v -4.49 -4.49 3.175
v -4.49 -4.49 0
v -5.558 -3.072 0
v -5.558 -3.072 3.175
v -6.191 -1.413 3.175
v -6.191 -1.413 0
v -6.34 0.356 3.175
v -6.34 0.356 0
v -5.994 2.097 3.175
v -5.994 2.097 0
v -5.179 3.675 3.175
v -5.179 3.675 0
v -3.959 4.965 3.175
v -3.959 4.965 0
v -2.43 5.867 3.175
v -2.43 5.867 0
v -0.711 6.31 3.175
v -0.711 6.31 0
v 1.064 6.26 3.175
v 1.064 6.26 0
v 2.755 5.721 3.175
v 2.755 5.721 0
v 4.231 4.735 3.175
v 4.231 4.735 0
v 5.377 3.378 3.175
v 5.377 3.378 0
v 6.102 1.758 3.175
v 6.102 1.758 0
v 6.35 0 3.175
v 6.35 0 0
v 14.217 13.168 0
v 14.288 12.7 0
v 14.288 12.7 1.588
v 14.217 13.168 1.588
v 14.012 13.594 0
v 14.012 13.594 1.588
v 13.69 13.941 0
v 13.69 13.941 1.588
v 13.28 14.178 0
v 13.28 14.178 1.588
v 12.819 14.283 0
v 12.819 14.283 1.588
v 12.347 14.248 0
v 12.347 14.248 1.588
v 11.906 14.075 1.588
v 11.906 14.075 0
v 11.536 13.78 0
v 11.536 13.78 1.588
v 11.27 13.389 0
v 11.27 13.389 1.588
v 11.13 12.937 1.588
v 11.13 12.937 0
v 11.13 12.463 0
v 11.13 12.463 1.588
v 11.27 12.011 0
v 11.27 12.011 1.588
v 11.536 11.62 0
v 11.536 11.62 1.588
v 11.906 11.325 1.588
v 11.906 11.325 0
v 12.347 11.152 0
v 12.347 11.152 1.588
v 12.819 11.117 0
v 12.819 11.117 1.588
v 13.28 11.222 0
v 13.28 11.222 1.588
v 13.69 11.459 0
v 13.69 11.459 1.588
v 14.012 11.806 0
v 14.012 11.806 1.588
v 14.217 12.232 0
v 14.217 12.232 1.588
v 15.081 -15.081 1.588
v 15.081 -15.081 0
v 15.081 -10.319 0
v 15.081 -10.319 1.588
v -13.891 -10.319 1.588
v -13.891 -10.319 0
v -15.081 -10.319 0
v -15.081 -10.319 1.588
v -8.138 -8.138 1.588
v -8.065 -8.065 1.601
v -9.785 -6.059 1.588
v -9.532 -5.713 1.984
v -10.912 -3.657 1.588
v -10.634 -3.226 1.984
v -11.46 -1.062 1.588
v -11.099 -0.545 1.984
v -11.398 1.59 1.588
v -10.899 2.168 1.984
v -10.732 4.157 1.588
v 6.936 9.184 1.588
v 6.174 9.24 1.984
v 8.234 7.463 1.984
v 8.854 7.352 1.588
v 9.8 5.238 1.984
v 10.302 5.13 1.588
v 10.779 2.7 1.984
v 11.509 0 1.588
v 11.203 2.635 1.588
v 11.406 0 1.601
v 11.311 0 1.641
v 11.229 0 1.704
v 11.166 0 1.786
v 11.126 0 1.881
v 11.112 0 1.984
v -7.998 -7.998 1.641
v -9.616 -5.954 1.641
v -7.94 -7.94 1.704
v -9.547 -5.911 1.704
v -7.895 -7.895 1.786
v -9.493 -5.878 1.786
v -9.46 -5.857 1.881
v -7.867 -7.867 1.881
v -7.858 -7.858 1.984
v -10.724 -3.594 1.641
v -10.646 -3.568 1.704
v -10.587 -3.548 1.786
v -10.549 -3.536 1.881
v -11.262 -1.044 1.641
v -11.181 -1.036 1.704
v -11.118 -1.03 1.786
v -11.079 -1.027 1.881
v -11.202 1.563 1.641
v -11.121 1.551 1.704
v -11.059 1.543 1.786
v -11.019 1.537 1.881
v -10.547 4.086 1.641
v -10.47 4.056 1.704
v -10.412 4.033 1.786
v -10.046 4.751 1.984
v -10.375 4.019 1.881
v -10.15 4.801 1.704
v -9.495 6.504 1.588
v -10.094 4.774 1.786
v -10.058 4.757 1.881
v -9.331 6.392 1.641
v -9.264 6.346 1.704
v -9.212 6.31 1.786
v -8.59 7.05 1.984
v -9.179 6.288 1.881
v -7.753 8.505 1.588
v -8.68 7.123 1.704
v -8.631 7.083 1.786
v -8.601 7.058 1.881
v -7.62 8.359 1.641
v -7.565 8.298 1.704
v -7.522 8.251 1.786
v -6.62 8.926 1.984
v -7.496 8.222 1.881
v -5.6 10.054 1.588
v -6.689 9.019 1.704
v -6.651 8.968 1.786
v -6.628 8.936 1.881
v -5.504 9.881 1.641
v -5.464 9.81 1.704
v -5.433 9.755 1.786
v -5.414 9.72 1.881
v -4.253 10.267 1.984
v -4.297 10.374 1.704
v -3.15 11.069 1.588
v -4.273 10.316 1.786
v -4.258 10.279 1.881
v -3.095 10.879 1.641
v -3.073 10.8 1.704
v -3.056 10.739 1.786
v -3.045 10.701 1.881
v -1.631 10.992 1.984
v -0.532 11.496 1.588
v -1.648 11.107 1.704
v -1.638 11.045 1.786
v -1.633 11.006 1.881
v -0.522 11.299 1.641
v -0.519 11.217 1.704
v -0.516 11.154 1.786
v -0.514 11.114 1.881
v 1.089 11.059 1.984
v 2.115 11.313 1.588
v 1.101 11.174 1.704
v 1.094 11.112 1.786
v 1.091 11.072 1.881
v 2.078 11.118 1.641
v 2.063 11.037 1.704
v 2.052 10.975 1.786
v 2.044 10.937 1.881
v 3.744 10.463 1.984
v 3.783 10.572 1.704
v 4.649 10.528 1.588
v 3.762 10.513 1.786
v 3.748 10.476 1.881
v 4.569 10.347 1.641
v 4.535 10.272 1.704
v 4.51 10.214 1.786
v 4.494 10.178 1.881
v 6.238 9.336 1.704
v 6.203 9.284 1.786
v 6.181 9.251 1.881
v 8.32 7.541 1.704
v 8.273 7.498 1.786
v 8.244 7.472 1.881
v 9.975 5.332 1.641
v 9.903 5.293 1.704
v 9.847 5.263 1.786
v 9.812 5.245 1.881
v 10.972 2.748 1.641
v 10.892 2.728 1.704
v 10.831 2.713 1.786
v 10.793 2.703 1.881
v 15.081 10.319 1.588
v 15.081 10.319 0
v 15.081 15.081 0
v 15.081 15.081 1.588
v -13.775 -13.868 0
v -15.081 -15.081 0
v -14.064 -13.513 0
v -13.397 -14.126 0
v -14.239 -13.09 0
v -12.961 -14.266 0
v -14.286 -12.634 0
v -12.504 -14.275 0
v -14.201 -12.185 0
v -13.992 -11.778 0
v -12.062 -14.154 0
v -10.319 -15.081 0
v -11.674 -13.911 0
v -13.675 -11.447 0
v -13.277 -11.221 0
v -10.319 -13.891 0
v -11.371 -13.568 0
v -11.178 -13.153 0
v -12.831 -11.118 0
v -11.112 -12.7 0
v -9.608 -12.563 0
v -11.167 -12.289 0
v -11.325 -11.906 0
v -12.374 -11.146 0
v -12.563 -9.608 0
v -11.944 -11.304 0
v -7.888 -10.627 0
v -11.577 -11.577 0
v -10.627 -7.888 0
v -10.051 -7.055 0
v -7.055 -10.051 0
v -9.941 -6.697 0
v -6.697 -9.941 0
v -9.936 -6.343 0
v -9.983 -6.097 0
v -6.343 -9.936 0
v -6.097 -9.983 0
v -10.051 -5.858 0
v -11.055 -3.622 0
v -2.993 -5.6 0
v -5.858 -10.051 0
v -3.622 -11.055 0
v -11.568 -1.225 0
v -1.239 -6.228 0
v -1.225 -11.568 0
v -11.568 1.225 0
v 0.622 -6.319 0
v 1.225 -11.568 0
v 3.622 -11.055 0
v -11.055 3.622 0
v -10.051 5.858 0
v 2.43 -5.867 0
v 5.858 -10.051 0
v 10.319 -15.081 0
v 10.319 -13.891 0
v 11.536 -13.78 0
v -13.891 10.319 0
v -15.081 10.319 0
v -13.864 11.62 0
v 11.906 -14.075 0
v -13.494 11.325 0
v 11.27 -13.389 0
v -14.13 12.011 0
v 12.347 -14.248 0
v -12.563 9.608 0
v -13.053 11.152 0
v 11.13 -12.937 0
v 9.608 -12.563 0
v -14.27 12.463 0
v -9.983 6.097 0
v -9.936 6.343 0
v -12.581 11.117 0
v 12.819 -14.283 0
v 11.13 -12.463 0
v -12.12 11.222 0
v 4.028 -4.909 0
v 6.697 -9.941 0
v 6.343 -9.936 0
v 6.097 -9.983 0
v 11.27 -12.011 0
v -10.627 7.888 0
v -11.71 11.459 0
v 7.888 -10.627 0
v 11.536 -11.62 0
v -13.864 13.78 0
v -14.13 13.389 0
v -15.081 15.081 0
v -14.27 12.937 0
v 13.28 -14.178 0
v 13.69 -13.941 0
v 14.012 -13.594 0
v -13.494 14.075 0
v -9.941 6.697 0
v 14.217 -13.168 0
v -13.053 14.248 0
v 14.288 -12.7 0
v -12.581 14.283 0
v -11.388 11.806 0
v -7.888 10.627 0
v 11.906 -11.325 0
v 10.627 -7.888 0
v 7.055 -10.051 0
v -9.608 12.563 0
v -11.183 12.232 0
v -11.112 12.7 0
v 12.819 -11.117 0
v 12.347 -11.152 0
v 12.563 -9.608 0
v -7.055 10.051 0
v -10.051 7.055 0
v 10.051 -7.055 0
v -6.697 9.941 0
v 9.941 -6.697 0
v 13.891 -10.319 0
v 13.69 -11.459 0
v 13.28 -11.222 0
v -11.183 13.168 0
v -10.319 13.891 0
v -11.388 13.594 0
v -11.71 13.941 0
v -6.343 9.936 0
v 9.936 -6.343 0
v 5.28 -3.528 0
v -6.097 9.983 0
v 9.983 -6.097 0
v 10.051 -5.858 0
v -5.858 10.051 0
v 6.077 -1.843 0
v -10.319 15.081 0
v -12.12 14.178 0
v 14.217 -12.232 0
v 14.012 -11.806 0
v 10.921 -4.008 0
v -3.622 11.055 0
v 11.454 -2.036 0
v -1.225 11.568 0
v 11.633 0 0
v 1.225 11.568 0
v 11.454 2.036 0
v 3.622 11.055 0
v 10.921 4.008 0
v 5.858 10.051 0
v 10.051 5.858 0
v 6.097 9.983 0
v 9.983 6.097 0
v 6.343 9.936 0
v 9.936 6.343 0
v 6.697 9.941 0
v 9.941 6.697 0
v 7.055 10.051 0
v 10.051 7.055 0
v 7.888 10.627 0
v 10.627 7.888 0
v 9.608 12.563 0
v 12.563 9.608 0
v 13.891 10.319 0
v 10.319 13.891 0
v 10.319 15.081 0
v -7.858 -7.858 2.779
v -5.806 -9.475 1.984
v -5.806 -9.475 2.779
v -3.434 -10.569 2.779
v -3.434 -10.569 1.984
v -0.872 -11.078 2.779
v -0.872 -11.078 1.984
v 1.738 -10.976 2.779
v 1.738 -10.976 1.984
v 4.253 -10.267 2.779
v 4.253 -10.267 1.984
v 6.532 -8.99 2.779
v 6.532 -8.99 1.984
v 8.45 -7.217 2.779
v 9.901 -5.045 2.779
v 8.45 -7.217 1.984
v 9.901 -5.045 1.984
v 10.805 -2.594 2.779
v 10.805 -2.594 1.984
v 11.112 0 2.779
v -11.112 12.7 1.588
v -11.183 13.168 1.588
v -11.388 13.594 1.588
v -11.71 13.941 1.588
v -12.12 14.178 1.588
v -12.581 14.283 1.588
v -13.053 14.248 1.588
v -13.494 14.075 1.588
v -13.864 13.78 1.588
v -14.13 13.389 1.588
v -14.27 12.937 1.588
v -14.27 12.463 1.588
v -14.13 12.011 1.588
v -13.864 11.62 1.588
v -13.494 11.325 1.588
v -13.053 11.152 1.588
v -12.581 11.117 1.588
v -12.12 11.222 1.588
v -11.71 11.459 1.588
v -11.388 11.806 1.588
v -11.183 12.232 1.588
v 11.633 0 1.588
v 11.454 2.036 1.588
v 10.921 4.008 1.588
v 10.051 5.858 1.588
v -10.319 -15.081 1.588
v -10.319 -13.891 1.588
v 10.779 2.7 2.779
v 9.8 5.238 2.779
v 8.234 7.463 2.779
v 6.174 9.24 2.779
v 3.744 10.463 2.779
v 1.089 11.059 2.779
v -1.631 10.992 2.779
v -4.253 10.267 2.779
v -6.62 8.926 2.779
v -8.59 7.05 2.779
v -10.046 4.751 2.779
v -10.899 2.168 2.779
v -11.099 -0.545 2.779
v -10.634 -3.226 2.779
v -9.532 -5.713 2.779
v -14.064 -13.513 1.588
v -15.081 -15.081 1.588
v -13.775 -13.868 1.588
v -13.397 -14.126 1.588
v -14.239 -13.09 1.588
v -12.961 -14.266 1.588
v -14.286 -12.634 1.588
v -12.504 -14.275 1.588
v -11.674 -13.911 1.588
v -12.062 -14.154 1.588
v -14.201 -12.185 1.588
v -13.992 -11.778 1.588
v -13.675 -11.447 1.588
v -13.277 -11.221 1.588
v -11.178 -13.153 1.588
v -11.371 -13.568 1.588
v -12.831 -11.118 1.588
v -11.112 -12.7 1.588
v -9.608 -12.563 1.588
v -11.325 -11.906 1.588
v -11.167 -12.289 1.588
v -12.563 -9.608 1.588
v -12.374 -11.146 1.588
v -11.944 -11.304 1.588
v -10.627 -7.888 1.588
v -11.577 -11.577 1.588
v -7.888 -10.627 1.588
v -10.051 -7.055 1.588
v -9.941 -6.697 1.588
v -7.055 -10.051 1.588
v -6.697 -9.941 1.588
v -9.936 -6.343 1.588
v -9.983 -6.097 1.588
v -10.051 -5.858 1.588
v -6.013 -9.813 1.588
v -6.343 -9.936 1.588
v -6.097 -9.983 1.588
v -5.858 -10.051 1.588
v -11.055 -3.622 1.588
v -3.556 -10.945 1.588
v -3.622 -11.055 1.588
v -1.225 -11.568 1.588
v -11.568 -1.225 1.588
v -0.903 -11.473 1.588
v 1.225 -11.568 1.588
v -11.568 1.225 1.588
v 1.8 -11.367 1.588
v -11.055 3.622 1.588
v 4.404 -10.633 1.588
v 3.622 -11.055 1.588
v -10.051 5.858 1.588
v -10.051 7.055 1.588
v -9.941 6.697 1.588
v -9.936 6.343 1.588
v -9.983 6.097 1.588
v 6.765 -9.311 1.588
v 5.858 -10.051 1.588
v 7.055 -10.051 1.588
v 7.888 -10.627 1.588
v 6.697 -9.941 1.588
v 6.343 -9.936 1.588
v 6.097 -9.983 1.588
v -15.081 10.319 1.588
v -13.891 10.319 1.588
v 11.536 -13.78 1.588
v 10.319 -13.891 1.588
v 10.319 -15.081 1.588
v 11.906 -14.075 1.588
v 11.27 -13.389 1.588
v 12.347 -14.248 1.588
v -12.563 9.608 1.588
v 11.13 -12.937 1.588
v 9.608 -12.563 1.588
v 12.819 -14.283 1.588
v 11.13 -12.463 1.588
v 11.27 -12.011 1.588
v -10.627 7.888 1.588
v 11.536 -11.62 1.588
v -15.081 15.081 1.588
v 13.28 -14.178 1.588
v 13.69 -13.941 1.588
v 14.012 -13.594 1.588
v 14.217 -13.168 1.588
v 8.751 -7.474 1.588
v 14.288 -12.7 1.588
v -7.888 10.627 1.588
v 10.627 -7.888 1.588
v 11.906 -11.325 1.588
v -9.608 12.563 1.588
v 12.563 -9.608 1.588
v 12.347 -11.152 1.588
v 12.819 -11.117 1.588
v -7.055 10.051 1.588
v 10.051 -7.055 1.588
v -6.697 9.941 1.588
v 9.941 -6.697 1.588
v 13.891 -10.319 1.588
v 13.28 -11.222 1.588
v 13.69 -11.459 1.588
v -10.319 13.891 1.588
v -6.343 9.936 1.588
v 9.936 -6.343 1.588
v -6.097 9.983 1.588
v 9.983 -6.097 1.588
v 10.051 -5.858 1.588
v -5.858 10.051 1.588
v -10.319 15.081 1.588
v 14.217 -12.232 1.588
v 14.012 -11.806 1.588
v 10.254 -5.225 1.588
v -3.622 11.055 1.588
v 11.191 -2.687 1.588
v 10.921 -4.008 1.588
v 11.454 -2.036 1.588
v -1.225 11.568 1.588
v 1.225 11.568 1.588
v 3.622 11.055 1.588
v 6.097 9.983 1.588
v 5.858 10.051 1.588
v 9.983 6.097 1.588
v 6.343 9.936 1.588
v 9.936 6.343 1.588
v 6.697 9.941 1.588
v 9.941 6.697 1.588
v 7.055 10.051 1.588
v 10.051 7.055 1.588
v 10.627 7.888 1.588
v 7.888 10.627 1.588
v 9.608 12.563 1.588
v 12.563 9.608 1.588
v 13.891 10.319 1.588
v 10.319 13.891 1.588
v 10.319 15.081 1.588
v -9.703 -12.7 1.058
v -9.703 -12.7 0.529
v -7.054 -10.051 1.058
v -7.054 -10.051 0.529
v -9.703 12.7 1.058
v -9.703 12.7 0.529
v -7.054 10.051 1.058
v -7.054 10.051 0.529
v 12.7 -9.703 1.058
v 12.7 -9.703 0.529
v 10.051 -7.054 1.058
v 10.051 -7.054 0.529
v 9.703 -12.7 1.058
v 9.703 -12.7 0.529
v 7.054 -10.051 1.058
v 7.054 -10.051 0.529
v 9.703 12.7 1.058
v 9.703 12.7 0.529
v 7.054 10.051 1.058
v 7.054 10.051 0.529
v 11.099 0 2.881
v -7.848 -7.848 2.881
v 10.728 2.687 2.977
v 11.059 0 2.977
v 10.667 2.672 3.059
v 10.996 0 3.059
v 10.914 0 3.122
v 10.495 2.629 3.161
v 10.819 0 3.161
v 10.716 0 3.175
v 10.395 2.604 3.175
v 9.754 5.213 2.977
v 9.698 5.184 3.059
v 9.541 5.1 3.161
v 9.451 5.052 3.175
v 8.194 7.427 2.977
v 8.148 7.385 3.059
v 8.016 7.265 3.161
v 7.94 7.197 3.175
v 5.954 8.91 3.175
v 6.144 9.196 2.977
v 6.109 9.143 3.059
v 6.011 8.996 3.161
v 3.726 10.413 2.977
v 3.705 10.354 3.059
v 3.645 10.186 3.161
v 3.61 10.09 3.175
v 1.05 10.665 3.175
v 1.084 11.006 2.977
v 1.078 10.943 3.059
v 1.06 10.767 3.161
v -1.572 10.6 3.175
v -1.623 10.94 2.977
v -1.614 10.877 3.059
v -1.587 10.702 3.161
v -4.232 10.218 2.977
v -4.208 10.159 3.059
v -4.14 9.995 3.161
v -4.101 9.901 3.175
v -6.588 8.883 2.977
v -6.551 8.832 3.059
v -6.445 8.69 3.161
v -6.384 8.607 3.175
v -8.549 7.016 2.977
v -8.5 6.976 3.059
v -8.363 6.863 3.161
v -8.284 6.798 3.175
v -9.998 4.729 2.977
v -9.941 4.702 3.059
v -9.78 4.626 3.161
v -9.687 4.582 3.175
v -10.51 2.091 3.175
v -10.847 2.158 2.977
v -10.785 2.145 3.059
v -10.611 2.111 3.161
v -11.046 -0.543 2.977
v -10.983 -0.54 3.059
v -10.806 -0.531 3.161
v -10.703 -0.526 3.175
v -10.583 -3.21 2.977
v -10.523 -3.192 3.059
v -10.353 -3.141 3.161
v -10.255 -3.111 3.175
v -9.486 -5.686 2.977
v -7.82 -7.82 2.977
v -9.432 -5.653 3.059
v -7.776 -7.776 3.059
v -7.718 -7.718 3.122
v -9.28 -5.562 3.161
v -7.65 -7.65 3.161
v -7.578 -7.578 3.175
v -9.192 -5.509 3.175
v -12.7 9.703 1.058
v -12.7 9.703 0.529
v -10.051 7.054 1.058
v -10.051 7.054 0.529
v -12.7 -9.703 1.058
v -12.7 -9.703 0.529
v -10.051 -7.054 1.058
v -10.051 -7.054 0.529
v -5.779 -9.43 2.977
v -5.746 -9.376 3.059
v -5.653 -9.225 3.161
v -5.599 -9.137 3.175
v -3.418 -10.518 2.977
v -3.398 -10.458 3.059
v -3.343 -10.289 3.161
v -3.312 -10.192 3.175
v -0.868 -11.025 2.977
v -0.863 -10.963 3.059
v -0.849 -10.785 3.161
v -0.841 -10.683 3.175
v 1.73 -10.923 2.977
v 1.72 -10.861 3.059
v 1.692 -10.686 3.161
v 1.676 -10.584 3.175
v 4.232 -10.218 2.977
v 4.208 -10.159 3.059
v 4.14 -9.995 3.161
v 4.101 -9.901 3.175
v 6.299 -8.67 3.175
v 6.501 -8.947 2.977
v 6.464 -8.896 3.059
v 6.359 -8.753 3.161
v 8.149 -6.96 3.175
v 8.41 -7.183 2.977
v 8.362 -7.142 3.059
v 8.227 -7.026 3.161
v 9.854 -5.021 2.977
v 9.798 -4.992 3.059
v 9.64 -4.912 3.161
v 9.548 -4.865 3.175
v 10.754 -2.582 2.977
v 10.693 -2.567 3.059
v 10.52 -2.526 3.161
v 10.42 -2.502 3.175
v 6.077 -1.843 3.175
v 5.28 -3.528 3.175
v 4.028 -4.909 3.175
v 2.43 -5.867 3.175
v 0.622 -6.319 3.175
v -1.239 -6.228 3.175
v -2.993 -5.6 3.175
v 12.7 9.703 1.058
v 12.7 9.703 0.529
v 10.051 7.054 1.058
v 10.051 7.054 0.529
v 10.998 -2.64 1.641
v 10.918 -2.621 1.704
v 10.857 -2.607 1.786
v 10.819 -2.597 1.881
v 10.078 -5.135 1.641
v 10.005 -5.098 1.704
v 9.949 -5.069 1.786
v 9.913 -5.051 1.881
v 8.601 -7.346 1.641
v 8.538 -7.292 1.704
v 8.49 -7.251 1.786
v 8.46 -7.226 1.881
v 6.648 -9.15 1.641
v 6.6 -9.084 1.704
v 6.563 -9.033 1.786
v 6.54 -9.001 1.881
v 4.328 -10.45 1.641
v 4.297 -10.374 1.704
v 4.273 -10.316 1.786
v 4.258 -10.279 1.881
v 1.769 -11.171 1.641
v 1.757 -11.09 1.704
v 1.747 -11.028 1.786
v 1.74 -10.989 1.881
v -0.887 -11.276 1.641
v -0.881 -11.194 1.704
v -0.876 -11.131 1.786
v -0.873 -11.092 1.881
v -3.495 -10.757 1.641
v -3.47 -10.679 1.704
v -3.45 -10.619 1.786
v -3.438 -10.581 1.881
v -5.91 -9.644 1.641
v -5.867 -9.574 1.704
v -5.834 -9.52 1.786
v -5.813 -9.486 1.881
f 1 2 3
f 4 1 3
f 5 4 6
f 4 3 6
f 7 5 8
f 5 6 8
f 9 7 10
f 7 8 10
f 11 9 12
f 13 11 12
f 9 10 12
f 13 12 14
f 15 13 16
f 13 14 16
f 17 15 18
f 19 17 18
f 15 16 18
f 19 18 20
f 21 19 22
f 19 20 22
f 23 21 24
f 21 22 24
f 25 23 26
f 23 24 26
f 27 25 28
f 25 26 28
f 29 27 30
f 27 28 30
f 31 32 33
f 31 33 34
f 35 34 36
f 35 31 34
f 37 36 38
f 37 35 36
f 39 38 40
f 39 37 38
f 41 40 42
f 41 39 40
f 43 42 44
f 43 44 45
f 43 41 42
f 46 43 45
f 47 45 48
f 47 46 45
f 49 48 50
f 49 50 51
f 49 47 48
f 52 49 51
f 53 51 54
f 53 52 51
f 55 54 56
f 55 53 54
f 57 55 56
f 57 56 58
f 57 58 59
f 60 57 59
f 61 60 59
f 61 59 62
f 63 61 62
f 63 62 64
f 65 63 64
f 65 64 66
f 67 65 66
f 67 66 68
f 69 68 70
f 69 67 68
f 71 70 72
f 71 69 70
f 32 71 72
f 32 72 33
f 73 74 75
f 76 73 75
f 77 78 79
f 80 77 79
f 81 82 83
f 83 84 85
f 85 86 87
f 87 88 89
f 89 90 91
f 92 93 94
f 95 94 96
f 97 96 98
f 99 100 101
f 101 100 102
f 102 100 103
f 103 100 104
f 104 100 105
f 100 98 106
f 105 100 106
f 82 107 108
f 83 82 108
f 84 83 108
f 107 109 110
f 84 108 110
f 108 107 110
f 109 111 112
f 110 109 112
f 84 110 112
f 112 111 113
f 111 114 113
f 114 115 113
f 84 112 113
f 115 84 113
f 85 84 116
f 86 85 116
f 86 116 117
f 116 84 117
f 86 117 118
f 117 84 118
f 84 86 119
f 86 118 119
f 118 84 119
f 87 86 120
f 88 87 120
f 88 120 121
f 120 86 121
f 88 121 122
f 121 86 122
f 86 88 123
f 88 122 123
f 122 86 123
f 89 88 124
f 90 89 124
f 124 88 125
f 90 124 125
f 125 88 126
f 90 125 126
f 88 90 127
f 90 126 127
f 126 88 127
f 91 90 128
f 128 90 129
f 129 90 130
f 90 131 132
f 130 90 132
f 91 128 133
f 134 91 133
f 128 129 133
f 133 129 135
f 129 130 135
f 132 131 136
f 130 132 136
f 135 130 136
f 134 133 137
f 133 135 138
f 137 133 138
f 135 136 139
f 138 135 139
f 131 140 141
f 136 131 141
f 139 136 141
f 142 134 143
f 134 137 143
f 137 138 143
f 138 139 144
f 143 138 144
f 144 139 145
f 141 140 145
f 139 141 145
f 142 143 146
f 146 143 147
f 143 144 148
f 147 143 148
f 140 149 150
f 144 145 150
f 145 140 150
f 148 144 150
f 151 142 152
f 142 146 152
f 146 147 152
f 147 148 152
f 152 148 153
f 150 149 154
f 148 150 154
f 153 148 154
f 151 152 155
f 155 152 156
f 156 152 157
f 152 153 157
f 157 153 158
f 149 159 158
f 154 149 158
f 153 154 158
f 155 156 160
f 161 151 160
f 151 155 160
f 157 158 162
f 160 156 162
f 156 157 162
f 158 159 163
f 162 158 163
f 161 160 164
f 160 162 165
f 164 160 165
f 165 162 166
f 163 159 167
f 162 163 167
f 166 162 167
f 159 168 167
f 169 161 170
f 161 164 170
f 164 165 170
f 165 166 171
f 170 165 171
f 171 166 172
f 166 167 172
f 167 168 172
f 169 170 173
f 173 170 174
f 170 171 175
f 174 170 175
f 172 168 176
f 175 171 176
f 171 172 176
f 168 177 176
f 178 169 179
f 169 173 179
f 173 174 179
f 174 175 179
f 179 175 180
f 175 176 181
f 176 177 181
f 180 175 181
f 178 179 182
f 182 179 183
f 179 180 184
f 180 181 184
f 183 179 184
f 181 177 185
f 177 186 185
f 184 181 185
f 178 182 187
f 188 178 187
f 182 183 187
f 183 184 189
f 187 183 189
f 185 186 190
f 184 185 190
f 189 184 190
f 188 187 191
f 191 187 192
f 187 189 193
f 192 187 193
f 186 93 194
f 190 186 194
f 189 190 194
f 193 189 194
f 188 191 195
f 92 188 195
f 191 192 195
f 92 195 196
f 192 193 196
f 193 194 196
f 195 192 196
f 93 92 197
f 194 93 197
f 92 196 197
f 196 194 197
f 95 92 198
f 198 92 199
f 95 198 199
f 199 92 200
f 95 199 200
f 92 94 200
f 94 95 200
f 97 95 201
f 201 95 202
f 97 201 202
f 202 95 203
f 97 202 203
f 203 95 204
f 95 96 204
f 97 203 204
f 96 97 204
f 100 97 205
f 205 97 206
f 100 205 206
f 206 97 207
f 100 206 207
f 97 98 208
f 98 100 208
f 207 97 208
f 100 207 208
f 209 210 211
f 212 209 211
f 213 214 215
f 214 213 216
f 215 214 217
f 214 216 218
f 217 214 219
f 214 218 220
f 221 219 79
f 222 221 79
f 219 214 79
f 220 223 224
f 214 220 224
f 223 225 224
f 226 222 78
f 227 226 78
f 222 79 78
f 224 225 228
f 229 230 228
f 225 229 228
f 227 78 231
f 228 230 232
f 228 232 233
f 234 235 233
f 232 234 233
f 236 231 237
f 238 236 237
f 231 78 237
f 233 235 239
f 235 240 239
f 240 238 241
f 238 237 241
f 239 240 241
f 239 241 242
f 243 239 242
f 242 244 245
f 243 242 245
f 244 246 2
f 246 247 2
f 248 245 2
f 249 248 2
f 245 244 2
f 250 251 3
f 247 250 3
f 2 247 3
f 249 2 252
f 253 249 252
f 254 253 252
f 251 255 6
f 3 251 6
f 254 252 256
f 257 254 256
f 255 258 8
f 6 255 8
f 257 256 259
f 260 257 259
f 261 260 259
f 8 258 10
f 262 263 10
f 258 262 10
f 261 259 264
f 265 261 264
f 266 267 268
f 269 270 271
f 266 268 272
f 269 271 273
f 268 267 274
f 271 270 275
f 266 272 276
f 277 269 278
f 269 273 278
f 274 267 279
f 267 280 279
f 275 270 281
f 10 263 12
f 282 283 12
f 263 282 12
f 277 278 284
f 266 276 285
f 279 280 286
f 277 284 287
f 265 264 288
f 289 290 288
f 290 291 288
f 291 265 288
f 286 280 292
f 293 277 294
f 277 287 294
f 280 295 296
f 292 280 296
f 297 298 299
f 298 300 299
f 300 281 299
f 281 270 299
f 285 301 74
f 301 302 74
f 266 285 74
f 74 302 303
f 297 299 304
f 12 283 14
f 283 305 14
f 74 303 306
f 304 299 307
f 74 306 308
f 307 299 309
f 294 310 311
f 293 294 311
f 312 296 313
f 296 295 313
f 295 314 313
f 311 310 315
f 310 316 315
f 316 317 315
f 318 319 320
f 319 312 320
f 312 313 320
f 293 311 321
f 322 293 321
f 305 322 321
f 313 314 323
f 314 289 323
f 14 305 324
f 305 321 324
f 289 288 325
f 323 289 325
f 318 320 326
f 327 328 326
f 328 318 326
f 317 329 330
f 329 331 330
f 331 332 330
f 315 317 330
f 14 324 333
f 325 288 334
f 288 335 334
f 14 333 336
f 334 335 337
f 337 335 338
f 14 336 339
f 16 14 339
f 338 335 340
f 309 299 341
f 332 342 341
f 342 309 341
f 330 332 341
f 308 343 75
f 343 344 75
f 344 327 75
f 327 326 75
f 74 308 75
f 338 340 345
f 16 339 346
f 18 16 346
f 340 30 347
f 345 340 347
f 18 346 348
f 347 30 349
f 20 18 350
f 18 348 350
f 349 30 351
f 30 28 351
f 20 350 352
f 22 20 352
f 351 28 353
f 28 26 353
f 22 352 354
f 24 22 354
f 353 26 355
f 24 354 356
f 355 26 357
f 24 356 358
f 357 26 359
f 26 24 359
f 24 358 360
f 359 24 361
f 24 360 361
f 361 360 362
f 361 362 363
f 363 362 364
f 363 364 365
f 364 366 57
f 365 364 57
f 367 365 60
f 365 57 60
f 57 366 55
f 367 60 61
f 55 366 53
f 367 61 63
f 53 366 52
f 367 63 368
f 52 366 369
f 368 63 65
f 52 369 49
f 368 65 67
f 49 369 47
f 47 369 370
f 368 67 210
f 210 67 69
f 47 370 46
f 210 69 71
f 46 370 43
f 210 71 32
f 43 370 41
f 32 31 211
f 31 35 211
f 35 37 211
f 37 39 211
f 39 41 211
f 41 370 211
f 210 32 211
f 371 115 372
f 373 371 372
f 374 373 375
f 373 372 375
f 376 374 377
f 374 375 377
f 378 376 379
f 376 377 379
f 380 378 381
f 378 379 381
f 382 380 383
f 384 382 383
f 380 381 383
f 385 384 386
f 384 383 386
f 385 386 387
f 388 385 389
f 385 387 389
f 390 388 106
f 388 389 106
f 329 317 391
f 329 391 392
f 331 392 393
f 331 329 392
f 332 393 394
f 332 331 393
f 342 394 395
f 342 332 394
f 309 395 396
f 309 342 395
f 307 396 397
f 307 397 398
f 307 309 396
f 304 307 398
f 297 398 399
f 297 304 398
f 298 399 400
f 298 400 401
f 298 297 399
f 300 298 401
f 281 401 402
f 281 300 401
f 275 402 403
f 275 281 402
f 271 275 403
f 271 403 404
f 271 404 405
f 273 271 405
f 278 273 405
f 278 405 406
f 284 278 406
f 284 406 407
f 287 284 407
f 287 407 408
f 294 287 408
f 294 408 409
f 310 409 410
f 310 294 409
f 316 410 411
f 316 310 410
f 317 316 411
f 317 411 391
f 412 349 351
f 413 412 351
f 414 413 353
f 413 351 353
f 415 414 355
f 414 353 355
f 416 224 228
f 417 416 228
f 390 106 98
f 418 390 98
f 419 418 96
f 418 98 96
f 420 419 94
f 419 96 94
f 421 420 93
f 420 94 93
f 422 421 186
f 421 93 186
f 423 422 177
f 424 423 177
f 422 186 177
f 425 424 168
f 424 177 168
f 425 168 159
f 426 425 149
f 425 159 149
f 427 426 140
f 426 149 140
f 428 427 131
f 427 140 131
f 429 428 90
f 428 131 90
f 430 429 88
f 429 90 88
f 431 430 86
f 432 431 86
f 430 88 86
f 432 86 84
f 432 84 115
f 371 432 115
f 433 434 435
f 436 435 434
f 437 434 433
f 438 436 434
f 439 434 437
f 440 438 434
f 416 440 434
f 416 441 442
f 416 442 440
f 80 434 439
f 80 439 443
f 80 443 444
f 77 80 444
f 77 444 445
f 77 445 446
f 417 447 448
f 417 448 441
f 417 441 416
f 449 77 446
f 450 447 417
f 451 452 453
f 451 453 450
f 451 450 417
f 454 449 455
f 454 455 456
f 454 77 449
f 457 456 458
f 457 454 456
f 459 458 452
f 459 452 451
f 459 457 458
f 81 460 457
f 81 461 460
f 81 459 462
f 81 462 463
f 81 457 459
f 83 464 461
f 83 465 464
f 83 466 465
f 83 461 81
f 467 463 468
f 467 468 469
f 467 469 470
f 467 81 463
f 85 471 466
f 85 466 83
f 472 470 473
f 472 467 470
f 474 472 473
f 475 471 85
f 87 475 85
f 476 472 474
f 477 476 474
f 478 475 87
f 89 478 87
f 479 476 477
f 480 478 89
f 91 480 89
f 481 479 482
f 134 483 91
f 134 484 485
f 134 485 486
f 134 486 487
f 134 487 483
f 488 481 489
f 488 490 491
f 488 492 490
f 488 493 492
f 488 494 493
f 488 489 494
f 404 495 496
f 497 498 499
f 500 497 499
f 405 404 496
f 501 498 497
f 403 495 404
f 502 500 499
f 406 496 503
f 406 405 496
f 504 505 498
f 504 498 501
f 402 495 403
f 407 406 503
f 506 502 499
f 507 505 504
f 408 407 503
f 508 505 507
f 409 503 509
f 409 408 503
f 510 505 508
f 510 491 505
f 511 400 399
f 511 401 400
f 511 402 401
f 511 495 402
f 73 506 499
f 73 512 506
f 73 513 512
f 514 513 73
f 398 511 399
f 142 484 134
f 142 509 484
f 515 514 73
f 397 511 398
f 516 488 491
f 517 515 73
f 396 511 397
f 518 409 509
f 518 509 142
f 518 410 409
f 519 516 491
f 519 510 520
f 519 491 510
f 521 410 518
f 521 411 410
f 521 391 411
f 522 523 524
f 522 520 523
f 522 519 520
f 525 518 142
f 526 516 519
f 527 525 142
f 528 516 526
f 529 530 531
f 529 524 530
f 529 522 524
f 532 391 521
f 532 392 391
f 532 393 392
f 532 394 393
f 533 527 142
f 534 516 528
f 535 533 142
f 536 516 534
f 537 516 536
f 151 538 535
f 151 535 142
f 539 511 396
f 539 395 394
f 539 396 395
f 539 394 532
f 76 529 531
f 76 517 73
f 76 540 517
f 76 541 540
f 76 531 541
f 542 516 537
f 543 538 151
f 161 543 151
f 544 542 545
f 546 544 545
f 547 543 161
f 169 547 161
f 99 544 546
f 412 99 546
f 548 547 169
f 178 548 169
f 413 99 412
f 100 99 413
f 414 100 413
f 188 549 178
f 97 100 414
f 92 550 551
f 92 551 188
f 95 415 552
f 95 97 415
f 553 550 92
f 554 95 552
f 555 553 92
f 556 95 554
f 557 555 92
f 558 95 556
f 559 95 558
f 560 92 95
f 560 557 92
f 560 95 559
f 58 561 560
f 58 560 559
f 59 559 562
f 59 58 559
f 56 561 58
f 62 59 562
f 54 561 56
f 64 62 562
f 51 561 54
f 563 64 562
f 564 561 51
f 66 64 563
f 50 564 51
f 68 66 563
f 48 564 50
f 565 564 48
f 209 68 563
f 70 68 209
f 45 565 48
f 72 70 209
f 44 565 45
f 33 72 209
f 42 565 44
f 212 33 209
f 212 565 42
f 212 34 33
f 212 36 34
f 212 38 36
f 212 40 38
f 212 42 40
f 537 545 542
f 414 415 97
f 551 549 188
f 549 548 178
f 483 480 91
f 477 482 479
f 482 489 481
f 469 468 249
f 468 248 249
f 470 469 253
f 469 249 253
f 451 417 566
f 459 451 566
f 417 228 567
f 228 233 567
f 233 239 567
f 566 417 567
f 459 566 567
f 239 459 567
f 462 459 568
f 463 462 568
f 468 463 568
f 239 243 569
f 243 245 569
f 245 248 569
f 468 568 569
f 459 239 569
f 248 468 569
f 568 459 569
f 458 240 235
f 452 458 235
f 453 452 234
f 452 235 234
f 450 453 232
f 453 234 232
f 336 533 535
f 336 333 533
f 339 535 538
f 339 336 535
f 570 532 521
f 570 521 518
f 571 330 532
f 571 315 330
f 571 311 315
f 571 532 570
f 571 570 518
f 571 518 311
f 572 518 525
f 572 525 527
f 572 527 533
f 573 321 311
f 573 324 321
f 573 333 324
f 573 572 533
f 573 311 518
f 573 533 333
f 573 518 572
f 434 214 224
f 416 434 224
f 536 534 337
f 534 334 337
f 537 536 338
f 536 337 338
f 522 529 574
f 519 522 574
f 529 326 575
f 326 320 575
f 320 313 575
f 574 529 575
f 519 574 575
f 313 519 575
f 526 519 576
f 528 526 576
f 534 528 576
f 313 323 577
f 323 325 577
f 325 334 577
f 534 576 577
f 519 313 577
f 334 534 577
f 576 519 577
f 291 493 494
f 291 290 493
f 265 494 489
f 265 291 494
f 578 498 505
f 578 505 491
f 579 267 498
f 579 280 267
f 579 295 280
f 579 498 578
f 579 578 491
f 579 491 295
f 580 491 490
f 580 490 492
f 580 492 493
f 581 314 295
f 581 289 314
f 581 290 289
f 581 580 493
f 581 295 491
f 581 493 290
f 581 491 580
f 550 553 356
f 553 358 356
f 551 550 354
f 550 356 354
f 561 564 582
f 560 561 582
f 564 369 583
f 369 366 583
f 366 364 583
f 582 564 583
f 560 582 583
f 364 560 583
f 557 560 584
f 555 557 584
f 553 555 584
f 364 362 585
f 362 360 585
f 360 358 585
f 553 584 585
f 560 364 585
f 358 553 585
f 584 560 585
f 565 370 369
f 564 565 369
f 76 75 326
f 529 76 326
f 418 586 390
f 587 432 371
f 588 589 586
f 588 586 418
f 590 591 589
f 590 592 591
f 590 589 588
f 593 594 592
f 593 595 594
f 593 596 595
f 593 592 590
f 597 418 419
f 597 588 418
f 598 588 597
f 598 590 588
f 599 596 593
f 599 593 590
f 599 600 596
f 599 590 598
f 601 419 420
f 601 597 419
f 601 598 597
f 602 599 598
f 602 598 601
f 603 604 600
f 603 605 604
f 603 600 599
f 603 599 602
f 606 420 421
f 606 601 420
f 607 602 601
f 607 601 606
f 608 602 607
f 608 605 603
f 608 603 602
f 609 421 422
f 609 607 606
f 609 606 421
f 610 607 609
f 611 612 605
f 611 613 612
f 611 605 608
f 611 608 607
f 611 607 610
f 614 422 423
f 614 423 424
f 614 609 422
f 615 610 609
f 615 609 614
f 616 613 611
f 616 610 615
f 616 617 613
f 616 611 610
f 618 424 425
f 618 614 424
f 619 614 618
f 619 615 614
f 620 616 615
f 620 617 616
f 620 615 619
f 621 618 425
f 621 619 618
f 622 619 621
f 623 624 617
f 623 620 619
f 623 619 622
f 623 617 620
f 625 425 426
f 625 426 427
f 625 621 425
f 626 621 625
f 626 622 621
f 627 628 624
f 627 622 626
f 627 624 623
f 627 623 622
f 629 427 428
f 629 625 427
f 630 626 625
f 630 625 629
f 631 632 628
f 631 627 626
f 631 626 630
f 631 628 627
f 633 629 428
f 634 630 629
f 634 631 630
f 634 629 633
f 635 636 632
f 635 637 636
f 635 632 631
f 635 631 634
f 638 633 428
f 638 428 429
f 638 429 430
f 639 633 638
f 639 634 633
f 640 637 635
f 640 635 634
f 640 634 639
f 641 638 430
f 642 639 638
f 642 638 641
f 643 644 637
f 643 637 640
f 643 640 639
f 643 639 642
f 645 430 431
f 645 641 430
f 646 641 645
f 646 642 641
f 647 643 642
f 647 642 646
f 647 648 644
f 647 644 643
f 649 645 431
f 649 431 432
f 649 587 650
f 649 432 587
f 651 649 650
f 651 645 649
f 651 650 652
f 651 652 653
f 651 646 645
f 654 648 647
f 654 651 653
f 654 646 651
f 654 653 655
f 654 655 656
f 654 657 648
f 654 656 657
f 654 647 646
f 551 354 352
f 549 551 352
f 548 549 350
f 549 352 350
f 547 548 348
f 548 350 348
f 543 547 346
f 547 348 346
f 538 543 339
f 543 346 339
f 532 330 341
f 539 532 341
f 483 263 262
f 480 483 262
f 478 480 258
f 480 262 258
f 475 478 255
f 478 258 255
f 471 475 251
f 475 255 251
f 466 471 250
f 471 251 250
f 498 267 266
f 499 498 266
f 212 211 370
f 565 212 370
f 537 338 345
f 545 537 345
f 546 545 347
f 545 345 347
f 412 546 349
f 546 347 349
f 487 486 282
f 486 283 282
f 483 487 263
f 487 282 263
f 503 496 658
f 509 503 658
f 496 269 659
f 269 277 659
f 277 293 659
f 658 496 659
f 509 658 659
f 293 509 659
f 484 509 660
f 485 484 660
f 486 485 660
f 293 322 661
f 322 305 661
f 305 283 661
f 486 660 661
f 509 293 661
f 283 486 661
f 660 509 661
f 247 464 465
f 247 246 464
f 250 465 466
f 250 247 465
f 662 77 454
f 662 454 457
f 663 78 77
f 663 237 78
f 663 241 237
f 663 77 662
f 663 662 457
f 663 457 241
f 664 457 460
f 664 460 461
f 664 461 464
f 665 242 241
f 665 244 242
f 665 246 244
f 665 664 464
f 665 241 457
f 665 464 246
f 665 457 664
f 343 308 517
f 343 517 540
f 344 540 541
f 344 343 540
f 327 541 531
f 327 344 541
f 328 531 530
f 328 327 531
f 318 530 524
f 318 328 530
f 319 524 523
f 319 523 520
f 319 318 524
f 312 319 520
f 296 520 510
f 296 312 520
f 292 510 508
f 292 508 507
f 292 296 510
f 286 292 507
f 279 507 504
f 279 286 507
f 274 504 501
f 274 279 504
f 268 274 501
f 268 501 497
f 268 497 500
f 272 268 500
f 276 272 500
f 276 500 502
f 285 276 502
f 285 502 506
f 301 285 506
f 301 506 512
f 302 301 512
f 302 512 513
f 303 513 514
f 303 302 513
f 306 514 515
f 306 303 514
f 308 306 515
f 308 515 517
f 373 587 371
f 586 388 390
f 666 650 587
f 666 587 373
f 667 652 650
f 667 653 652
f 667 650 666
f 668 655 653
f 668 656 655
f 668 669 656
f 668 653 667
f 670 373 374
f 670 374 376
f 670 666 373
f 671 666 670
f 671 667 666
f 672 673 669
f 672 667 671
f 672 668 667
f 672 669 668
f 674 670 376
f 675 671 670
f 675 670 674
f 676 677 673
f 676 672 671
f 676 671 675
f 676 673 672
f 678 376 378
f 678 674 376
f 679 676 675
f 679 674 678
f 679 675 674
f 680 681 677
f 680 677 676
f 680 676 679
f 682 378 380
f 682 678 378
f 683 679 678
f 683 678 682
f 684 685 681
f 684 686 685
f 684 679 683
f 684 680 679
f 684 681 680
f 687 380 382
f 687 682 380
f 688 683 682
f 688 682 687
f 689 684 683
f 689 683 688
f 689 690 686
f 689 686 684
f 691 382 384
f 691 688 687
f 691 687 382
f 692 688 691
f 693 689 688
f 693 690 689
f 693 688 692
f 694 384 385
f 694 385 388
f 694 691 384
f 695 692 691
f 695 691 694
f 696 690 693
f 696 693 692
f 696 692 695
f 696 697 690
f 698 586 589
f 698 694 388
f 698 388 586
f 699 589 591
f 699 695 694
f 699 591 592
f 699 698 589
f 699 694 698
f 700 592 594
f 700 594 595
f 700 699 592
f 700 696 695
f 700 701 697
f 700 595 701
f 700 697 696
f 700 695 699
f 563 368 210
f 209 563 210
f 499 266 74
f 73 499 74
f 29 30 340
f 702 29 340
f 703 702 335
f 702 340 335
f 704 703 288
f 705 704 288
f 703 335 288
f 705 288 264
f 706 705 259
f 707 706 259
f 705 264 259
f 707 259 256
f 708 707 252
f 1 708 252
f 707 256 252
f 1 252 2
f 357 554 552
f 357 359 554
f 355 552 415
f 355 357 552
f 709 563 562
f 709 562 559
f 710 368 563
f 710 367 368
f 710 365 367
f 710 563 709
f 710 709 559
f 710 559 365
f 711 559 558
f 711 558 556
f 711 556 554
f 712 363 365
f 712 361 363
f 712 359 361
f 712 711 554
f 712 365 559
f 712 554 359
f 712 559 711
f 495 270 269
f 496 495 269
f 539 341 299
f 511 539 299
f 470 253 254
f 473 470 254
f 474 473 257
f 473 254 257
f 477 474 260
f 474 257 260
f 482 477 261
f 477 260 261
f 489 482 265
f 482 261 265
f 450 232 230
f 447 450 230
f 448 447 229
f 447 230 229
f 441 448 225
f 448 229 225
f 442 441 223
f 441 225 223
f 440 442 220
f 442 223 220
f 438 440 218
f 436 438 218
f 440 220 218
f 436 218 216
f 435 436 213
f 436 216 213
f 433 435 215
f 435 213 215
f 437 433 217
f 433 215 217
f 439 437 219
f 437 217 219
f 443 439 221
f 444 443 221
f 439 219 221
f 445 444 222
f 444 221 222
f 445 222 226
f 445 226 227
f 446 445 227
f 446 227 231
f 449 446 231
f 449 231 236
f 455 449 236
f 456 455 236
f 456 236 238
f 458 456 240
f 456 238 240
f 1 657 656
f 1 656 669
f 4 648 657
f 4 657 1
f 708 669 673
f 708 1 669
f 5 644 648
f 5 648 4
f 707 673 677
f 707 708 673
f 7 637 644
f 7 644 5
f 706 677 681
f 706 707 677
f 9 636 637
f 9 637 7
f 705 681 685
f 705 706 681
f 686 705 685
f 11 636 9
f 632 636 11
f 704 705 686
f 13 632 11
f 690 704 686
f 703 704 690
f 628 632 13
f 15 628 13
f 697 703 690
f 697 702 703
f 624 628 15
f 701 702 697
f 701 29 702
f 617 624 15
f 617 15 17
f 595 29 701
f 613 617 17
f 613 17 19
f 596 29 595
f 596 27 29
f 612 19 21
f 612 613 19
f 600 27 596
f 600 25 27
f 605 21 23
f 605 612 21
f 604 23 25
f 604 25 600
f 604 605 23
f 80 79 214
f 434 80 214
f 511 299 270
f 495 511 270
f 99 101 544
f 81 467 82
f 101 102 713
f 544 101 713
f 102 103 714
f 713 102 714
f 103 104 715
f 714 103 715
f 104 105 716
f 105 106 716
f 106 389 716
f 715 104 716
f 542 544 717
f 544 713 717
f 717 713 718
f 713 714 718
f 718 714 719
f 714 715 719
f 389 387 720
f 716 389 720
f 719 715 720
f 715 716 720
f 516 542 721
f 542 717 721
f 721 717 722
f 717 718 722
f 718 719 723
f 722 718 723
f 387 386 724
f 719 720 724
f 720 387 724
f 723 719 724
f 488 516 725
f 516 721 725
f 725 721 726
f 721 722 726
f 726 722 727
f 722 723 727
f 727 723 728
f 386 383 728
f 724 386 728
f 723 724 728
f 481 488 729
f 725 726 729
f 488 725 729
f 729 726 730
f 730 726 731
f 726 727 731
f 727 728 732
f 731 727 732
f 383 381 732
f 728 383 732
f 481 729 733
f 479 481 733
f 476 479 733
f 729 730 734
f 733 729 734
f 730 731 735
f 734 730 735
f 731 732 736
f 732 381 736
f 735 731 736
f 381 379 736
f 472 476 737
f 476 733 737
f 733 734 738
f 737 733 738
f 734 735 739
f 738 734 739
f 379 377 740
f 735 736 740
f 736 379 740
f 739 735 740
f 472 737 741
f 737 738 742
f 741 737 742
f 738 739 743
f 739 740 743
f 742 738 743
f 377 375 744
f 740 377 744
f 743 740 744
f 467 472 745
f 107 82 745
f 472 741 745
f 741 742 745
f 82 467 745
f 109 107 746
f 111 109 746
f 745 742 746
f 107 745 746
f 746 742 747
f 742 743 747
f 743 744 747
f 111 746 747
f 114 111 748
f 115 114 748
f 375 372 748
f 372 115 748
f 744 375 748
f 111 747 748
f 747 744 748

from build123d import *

# Parameters (mm, degrees)
F1_DEPTH = 3.175
F0_R     = 1.5875
F2_DEPTH = 1.5875
F3_R     = 0.39624


with BuildPart() as f1:
    # F0 (on Top) → F1 (new body)
    with BuildSketch(Plane.XY):
        with BuildLine():
            ThreePointArc((11.1125, 0), (-4.2525696422, 10.266611305), (-7.8577241059, -7.8577241059))
            ThreePointArc((-7.8577241059, -7.8577241059), (4.2525696422, -10.266611305), (11.1125, 0))
        make_face()
        with BuildLine():
            ThreePointArc((6.35, 0), (2.4300397955, -5.8666350314), (-4.4901280605, -4.4901280605))
            ThreePointArc((-4.4901280605, -4.4901280605), (-2.4300397955, 5.8666350314), (6.35, 0))
        make_face(mode=Mode.SUBTRACT)
    extrude(amount=F1_DEPTH)

    # F0 (on Top) → F2 (join)
    with BuildSketch(Plane.XY):
        with BuildLine():
            ThreePointArc((10.0508463237, -5.8576301025), (11.2306466353, -3.0337960369), (11.6332, 0))
            ThreePointArc((11.6332, 0), (11.2306466353, 3.0337960369), (10.0508463237, 5.8576301025))
            ThreePointArc((10.0508463237, 5.8576301025), (8.2259146069, 8.2259146069), (5.8576301025, 10.0508463237))
            ThreePointArc((5.8576301025, 10.0508463237), (0, 11.6332), (-5.8576301025, 10.0508463237))
            ThreePointArc((-5.8576301025, 10.0508463237), (-8.2259146069, 8.2259146069), (-10.0508463237, 5.8576301025))
            ThreePointArc((-10.0508463237, 5.8576301025), (-11.6332, 0), (-10.0508463237, -5.8576301025))
            ThreePointArc((-10.0508463237, -5.8576301025), (-9.2147810827, -7.1006444664), (-8.2259146069, -8.2259146069))
            ThreePointArc((-8.2259146069, -8.2259146069), (-7.1006444664, -9.2147810827), (-5.8576301025, -10.0508463237))
            ThreePointArc((-5.8576301025, -10.0508463237), (0, -11.6332), (5.8576301025, -10.0508463237))
            ThreePointArc((5.8576301025, -10.0508463237), (8.2259146069, -8.2259146069), (10.0508463237, -5.8576301025))
        make_face()
        with BuildLine():
            ThreePointArc((11.1125, 0), (4.2525696422, -10.266611305), (-7.8577241059, -7.8577241059))
            ThreePointArc((-7.8577241059, -7.8577241059), (-4.2525696422, 10.266611305), (11.1125, 0))
        make_face(mode=Mode.SUBTRACT)
        with BuildLine():
            ThreePointArc((-10.0508463237, 5.8576301025), (-8.2259146069, 8.2259146069), (-5.8576301025, 10.0508463237))
            add(Edge.make_bspline(
                [(-10.31875, 13.890625), (-10.1877713535, 13.556132491), (-9.8378118548, 12.6624079499), (-7.2130077738, 9.6441879633), (-6.2171876005, 9.9429671209), (-5.8576301025, 10.0508463237)],
                knots=[0, 0, 0, 0, 0.2764969064, 0.7387671297, 1, 1, 1, 1], degree=3))
            Line((-10.31875, 13.890625), (-10.31875, 10.31875))
            Line((-10.31875, 10.31875), (-13.890625, 10.31875))
            add(Edge.make_bspline(
                [(-13.890625, 10.31875), (-13.556132491, 10.1877713535), (-12.6624079499, 9.8378118548), (-9.6441879633, 7.2130077738), (-9.9429671209, 6.2171876005), (-10.0508463237, 5.8576301025)],
                knots=[0, 0, 0, 0, 0.2764969064, 0.7387671297, 1, 1, 1, 1], degree=3))
        make_face()
        Polygon((-10.31875, 10.31875), (-10.31875, 13.890625), (-10.31875, 15.08125), (-15.08125, 15.08125), (-15.08125, 10.31875), (-13.890625, 10.31875), align=None)
        with Locations((-12.7, 12.7)):
            Circle(F0_R, mode=Mode.SUBTRACT)
        with BuildLine():
            ThreePointArc((5.8576301025, 10.0508463237), (8.2259146069, 8.2259146069), (10.0508463237, 5.8576301025))
            add(Edge.make_bspline(
                [(13.890625, 10.31875), (13.556132491, 10.1877713535), (12.6624079499, 9.8378118548), (9.6441879633, 7.2130077738), (9.9429671209, 6.2171876005), (10.0508463237, 5.8576301025)],
                knots=[0, 0, 0, 0, 0.2764969064, 0.7387671297, 1, 1, 1, 1], degree=3))
            Line((13.890625, 10.31875), (10.31875, 10.31875))
            Line((10.31875, 10.31875), (10.31875, 13.890625))
            add(Edge.make_bspline(
                [(10.31875, 13.890625), (10.1877713535, 13.556132491), (9.8378118548, 12.6624079499), (7.2130077738, 9.6441879633), (6.2171876005, 9.9429671209), (5.8576301025, 10.0508463237)],
                knots=[0, 0, 0, 0, 0.2764969064, 0.7387671297, 1, 1, 1, 1], degree=3))
        make_face()
        Polygon((10.31875, 10.31875), (13.890625, 10.31875), (15.08125, 10.31875), (15.08125, 15.08125), (10.31875, 15.08125), (10.31875, 13.890625), align=None)
        with Locations((12.7, 12.7)):
            Circle(F0_R, mode=Mode.SUBTRACT)
        with BuildLine():
            add(Edge.make_bspline(
                [(13.890625, -10.31875), (13.556132491, -10.1877713535), (12.6624079499, -9.8378118548), (9.6441879633, -7.2130077738), (9.9429671209, -6.2171876005), (10.0508463237, -5.8576301025)],
                knots=[0, 0, 0, 0, 0.2764969064, 0.7387671297, 1, 1, 1, 1], degree=3))
            ThreePointArc((10.0508463237, -5.8576301025), (8.2259146069, -8.2259146069), (5.8576301025, -10.0508463237))
            add(Edge.make_bspline(
                [(10.31875, -13.890625), (10.1877713535, -13.556132491), (9.8378118548, -12.6624079499), (7.2130077738, -9.6441879633), (6.2171876005, -9.9429671209), (5.8576301025, -10.0508463237)],
                knots=[0, 0, 0, 0, 0.2764969064, 0.7387671297, 1, 1, 1, 1], degree=3))
            Line((10.31875, -13.890625), (10.31875, -10.31875))
            Line((10.31875, -10.31875), (13.890625, -10.31875))
        make_face()
        Polygon((15.08125, -10.31875), (13.890625, -10.31875), (10.31875, -10.31875), (10.31875, -13.890625), (10.31875, -15.08125), (15.08125, -15.08125), align=None)
        with Locations((12.7, -12.7)):
            Circle(F0_R, mode=Mode.SUBTRACT)
        with BuildLine():
            add(Edge.make_bspline(
                [(-10.31875, -13.890625), (-10.1877713535, -13.556132491), (-9.8378118548, -12.6624079499), (-7.2130077738, -9.6441879633), (-6.2171876005, -9.9429671209), (-5.8576301025, -10.0508463237)],
                knots=[0, 0, 0, 0, 0.2764969064, 0.7387671297, 1, 1, 1, 1], degree=3))
            ThreePointArc((-5.8576301025, -10.0508463237), (-7.1006444664, -9.2147810827), (-8.2259146069, -8.2259146069))
            Line((-8.2259146069, -8.2259146069), (-10.31875, -10.31875))
            Line((-10.31875, -10.31875), (-10.31875, -13.890625))
        make_face()
        with BuildLine():
            Line((-10.31875, -10.31875), (-8.2259146069, -8.2259146069))
            ThreePointArc((-8.2259146069, -8.2259146069), (-9.2147810827, -7.1006444664), (-10.0508463237, -5.8576301025))
            add(Edge.make_bspline(
                [(-13.890625, -10.31875), (-13.556132491, -10.1877713535), (-12.6624079499, -9.8378118548), (-9.6441879633, -7.2130077738), (-9.9429671209, -6.2171876005), (-10.0508463237, -5.8576301025)],
                knots=[0, 0, 0, 0, 0.2764969064, 0.7387671297, 1, 1, 1, 1], degree=3))
            Line((-13.890625, -10.31875), (-10.31875, -10.31875))
        make_face()
        Polygon((-10.31875, -15.08125), (-10.31875, -13.890625), (-10.31875, -10.31875), (-13.890625, -10.31875), (-15.08125, -10.31875), (-15.08125, -15.08125), align=None)
        with BuildLine():
            ThreePointArc((-11.1125, -12.7), (-14.1666587579, -13.3075099489), (-11.5774679849, -11.5774679849))
            ThreePointArc((-11.5774679849, -11.5774679849), (-11.2333412421, -12.0924900511), (-11.1125, -12.7))
        make_face(mode=Mode.SUBTRACT)
    extrude(amount=F2_DEPTH)

    # F3
    f3_edges = [f1.edges().sort_by_distance(p)[0] for p in [
        (7.857724, 7.857724, 1.5875),
        (-7.857724, -7.857724, 2.38125),
        (7.857724, 7.857724, 3.175),
    ]]
    fillet(f3_edges, radius=F3_R)


solid = f1.part
